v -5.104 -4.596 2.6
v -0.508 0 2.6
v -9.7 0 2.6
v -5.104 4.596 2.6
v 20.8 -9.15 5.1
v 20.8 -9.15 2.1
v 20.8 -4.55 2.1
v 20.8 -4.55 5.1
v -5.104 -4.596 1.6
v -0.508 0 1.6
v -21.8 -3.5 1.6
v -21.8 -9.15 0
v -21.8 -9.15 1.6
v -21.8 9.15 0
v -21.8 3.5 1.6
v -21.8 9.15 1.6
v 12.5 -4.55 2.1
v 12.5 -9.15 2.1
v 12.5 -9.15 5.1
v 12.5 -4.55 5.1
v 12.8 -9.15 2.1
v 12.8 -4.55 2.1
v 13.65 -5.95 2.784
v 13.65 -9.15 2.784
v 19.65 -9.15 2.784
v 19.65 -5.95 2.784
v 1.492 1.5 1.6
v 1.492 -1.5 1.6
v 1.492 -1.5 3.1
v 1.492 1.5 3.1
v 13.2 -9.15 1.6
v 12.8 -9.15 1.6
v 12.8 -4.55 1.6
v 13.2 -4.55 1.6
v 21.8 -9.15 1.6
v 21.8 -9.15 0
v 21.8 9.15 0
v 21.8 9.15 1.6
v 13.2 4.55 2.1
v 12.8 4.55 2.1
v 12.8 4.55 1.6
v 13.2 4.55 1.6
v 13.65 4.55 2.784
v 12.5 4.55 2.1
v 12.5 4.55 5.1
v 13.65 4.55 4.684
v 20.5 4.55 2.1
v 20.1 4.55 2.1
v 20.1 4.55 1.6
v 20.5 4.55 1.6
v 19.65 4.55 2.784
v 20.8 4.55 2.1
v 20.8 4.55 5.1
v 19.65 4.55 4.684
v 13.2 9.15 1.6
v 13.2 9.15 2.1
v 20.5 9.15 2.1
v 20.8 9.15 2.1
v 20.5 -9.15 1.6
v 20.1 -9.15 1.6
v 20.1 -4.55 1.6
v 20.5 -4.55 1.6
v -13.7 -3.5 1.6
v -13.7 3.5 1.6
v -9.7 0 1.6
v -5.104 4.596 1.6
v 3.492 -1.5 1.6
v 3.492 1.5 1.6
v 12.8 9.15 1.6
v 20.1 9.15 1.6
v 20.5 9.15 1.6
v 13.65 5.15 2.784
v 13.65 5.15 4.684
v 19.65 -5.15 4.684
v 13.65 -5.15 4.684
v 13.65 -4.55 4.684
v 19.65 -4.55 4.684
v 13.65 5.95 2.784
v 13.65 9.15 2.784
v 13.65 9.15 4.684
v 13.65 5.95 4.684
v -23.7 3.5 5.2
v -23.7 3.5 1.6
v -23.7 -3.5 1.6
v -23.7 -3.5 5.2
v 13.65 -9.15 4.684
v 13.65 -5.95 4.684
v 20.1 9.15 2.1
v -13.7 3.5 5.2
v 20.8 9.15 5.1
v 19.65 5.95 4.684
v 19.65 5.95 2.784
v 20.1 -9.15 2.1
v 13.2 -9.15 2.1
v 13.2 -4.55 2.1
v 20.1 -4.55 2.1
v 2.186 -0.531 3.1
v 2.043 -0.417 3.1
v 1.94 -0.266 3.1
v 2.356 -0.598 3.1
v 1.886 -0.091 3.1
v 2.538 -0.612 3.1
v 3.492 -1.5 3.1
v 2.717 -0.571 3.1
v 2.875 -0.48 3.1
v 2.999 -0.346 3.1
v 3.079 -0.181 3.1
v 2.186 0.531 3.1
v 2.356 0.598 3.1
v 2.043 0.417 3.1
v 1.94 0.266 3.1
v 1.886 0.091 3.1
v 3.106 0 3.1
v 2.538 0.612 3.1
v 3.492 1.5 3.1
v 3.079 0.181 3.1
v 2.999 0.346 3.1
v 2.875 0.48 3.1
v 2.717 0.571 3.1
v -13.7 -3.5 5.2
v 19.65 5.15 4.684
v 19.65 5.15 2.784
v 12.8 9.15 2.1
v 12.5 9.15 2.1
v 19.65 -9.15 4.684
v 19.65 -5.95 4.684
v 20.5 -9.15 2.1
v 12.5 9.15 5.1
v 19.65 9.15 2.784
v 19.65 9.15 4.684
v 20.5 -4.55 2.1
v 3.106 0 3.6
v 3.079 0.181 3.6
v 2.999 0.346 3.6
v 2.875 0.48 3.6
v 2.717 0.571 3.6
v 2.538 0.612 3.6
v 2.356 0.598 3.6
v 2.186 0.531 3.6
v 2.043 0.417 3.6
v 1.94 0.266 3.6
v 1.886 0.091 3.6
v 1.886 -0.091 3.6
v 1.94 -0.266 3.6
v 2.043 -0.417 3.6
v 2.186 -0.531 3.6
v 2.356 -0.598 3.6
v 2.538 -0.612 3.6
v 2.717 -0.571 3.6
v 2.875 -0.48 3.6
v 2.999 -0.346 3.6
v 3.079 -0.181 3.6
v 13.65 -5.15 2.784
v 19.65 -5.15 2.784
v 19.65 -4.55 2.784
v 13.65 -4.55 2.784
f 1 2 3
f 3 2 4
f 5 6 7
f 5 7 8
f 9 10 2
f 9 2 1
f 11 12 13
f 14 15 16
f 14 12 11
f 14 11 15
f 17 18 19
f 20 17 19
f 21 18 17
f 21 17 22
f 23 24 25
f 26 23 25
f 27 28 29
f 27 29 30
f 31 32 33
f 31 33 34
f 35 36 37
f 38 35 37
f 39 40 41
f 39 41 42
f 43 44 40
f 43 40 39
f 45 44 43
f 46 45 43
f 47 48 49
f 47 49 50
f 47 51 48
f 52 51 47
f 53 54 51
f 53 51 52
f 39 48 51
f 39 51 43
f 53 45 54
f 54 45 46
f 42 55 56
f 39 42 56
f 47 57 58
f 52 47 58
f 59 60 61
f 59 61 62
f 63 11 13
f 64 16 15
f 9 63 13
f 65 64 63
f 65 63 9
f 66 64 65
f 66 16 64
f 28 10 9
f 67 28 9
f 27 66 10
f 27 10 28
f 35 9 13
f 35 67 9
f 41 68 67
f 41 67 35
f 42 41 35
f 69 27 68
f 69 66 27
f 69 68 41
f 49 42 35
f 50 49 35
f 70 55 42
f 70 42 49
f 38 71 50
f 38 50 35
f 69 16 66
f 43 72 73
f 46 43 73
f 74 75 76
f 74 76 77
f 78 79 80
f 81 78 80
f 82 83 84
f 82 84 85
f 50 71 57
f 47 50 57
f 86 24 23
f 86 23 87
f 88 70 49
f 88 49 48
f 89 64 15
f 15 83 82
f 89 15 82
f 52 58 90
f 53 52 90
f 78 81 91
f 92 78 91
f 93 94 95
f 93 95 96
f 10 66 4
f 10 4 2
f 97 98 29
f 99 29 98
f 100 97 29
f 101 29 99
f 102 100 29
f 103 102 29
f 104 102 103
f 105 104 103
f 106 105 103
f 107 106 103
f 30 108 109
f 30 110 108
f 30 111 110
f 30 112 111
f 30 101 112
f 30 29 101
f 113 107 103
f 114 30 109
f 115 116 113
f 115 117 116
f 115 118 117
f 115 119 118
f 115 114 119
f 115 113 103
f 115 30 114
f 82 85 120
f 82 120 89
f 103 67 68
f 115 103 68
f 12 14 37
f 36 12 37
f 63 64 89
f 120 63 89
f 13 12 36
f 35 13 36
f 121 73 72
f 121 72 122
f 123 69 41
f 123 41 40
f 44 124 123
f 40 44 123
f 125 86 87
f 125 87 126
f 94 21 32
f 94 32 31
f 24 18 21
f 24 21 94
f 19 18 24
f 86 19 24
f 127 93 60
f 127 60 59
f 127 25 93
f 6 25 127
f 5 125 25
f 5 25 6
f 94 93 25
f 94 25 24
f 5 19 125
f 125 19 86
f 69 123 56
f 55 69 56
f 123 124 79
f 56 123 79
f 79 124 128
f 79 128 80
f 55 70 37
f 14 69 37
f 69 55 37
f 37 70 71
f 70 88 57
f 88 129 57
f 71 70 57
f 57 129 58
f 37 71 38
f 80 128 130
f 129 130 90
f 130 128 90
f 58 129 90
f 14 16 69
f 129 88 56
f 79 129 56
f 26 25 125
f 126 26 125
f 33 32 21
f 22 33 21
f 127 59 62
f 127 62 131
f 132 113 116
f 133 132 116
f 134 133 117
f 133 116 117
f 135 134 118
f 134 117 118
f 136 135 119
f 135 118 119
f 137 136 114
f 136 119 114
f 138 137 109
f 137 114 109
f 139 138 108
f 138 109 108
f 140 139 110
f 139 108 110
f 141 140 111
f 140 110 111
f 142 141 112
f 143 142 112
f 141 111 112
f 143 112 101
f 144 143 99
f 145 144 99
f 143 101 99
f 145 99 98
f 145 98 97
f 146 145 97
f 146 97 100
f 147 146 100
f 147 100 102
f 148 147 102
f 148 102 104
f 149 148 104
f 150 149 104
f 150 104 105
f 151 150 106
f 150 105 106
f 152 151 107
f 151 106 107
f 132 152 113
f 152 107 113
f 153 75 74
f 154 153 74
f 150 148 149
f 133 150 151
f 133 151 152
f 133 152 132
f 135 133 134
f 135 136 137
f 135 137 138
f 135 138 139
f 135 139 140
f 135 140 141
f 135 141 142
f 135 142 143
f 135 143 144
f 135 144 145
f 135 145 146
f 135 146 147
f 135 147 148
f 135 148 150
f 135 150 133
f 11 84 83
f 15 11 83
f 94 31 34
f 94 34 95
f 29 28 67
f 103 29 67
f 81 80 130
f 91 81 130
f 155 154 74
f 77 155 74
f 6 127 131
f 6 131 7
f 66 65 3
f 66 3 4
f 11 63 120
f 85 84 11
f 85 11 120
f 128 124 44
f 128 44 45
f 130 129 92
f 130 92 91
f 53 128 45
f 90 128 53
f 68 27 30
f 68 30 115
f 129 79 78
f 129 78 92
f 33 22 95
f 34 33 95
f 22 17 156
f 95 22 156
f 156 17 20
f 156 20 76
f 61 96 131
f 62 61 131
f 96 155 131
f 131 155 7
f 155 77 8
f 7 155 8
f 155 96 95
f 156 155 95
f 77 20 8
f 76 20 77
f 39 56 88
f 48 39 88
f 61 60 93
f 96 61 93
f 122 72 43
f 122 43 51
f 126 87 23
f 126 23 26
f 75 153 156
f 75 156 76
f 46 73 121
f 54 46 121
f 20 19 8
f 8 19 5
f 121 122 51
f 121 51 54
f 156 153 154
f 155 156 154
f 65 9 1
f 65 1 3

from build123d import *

# Parameters (mm, degrees)
SKETCH1_W               = 43.6
SKETCH1_H               = 18.3
BOSS_EXTRUDE1_DEPTH     = 1.6
USB_START               = 1.9
SKETCH2_W               = 3.6
SKETCH2_H               = 7
USB_CONNECTOR_DEPTH     = 10
MICROPROCESSOR_DEPTH    = 1
SKETCH4_W               = 2
SKETCH4_H               = 3
BUTTON_BASE_DEPTH       = 1.5
SKETCH5_R               = 0.613578093
BUTTON_DEPTH            = 0.5
SKETCH6_W               = 8.3
SKETCH6_H               = 3
SKETCH6_W_2             = 6
SKETCH6_H_2             = 1.9
SKETCH6_W_3             = 0.4
SKETCH6_H_3             = 0.5
JST_X_6_DEPTH           = 4.6
BOSS_EXTRUDE8_START     = -4
BOSS_EXTRUDE8_OUTLINE_W = 6
BOSS_EXTRUDE8_OUTLINE_H = 1.9
BOSS_EXTRUDE8_DEPTH     = 0.8


# Read off the part's stored shape, not the designer's step: Boss-Extrude8
with BuildPart() as part:
    # Sketch1 → Boss-Extrude1 (new body)
    with BuildSketch(Plane.XY):
        Rectangle(SKETCH1_W, SKETCH1_H)
    extrude(amount=BOSS_EXTRUDE1_DEPTH)

    # Sketch2 → USB Connector (add)
    with BuildSketch(Plane.ZY.offset(21.8).offset(USB_START)):
        with Locations((3.4, 0)):
            Rectangle(SKETCH2_W, SKETCH2_H)
    extrude(amount=-USB_CONNECTOR_DEPTH)

    # Sketch3 → MicroProcessor (add)
    with BuildSketch(Plane.XY.offset(1.6)):
        Polygon((-9.7, 0), (-5.103805922, 4.596194078), (-0.507611845, 0), (-5.103805922, -4.596194078), align=None)
    extrude(amount=MICROPROCESSOR_DEPTH)

    # Sketch4 → Button Base (add)
    with BuildSketch(Plane.XY.offset(1.6)):
        with Locations((2.492388155, 0)):
            Rectangle(SKETCH4_W, SKETCH4_H)
    extrude(amount=BUTTON_BASE_DEPTH)

    # Sketch5 → Button (add)
    with BuildSketch(Plane.XY.offset(3.1)):
        with Locations((2.492388155, 0)):
            Circle(SKETCH5_R)
    extrude(amount=BUTTON_DEPTH)


with BuildPart() as body_2:
    # Sketch6 → JST x 6 (new body)
    # profile 1 of 3: a face of its own
    with BuildSketch(Plane.XZ.offset(9.15)):
        with Locations((16.65, 3.6)):
            Rectangle(SKETCH6_W, SKETCH6_H)
        with Locations((16.65, 3.734337349)):
            Rectangle(SKETCH6_W_2, SKETCH6_H_2, mode=Mode.SUBTRACT)
    # profile 2 of 3: a face of its own
    with BuildSketch(Plane.XZ.offset(9.15)):
        with Locations((13, 1.85)):
            Rectangle(SKETCH6_W_3, SKETCH6_H_3)
    # profile 3 of 3: a face of its own
    with BuildSketch(Plane.XZ.offset(9.15)):
        with Locations((20.3, 1.85)):
            Rectangle(SKETCH6_W_3, SKETCH6_H_3)
    jst_x_6 = extrude(amount=-JST_X_6_DEPTH)

    # Boss-Extrude8 outline → Boss-Extrude8 (add)
    with BuildSketch(Plane.XZ.offset(9.15).offset(BOSS_EXTRUDE8_START)):
        with Locations((16.65, 3.734337349)):
            Rectangle(BOSS_EXTRUDE8_OUTLINE_W, BOSS_EXTRUDE8_OUTLINE_H)
    boss_extrude8 = extrude(amount=BOSS_EXTRUDE8_DEPTH)


with BuildPart() as part_1:
    add(part.part)

    # Mirror5: JST x 6, Boss-Extrude8 across plane
    add(jst_x_6.mirror(Plane.ZX))
    add(boss_extrude8.mirror(Plane.ZX))


solid = Compound([body_2.part, part_1.part])
